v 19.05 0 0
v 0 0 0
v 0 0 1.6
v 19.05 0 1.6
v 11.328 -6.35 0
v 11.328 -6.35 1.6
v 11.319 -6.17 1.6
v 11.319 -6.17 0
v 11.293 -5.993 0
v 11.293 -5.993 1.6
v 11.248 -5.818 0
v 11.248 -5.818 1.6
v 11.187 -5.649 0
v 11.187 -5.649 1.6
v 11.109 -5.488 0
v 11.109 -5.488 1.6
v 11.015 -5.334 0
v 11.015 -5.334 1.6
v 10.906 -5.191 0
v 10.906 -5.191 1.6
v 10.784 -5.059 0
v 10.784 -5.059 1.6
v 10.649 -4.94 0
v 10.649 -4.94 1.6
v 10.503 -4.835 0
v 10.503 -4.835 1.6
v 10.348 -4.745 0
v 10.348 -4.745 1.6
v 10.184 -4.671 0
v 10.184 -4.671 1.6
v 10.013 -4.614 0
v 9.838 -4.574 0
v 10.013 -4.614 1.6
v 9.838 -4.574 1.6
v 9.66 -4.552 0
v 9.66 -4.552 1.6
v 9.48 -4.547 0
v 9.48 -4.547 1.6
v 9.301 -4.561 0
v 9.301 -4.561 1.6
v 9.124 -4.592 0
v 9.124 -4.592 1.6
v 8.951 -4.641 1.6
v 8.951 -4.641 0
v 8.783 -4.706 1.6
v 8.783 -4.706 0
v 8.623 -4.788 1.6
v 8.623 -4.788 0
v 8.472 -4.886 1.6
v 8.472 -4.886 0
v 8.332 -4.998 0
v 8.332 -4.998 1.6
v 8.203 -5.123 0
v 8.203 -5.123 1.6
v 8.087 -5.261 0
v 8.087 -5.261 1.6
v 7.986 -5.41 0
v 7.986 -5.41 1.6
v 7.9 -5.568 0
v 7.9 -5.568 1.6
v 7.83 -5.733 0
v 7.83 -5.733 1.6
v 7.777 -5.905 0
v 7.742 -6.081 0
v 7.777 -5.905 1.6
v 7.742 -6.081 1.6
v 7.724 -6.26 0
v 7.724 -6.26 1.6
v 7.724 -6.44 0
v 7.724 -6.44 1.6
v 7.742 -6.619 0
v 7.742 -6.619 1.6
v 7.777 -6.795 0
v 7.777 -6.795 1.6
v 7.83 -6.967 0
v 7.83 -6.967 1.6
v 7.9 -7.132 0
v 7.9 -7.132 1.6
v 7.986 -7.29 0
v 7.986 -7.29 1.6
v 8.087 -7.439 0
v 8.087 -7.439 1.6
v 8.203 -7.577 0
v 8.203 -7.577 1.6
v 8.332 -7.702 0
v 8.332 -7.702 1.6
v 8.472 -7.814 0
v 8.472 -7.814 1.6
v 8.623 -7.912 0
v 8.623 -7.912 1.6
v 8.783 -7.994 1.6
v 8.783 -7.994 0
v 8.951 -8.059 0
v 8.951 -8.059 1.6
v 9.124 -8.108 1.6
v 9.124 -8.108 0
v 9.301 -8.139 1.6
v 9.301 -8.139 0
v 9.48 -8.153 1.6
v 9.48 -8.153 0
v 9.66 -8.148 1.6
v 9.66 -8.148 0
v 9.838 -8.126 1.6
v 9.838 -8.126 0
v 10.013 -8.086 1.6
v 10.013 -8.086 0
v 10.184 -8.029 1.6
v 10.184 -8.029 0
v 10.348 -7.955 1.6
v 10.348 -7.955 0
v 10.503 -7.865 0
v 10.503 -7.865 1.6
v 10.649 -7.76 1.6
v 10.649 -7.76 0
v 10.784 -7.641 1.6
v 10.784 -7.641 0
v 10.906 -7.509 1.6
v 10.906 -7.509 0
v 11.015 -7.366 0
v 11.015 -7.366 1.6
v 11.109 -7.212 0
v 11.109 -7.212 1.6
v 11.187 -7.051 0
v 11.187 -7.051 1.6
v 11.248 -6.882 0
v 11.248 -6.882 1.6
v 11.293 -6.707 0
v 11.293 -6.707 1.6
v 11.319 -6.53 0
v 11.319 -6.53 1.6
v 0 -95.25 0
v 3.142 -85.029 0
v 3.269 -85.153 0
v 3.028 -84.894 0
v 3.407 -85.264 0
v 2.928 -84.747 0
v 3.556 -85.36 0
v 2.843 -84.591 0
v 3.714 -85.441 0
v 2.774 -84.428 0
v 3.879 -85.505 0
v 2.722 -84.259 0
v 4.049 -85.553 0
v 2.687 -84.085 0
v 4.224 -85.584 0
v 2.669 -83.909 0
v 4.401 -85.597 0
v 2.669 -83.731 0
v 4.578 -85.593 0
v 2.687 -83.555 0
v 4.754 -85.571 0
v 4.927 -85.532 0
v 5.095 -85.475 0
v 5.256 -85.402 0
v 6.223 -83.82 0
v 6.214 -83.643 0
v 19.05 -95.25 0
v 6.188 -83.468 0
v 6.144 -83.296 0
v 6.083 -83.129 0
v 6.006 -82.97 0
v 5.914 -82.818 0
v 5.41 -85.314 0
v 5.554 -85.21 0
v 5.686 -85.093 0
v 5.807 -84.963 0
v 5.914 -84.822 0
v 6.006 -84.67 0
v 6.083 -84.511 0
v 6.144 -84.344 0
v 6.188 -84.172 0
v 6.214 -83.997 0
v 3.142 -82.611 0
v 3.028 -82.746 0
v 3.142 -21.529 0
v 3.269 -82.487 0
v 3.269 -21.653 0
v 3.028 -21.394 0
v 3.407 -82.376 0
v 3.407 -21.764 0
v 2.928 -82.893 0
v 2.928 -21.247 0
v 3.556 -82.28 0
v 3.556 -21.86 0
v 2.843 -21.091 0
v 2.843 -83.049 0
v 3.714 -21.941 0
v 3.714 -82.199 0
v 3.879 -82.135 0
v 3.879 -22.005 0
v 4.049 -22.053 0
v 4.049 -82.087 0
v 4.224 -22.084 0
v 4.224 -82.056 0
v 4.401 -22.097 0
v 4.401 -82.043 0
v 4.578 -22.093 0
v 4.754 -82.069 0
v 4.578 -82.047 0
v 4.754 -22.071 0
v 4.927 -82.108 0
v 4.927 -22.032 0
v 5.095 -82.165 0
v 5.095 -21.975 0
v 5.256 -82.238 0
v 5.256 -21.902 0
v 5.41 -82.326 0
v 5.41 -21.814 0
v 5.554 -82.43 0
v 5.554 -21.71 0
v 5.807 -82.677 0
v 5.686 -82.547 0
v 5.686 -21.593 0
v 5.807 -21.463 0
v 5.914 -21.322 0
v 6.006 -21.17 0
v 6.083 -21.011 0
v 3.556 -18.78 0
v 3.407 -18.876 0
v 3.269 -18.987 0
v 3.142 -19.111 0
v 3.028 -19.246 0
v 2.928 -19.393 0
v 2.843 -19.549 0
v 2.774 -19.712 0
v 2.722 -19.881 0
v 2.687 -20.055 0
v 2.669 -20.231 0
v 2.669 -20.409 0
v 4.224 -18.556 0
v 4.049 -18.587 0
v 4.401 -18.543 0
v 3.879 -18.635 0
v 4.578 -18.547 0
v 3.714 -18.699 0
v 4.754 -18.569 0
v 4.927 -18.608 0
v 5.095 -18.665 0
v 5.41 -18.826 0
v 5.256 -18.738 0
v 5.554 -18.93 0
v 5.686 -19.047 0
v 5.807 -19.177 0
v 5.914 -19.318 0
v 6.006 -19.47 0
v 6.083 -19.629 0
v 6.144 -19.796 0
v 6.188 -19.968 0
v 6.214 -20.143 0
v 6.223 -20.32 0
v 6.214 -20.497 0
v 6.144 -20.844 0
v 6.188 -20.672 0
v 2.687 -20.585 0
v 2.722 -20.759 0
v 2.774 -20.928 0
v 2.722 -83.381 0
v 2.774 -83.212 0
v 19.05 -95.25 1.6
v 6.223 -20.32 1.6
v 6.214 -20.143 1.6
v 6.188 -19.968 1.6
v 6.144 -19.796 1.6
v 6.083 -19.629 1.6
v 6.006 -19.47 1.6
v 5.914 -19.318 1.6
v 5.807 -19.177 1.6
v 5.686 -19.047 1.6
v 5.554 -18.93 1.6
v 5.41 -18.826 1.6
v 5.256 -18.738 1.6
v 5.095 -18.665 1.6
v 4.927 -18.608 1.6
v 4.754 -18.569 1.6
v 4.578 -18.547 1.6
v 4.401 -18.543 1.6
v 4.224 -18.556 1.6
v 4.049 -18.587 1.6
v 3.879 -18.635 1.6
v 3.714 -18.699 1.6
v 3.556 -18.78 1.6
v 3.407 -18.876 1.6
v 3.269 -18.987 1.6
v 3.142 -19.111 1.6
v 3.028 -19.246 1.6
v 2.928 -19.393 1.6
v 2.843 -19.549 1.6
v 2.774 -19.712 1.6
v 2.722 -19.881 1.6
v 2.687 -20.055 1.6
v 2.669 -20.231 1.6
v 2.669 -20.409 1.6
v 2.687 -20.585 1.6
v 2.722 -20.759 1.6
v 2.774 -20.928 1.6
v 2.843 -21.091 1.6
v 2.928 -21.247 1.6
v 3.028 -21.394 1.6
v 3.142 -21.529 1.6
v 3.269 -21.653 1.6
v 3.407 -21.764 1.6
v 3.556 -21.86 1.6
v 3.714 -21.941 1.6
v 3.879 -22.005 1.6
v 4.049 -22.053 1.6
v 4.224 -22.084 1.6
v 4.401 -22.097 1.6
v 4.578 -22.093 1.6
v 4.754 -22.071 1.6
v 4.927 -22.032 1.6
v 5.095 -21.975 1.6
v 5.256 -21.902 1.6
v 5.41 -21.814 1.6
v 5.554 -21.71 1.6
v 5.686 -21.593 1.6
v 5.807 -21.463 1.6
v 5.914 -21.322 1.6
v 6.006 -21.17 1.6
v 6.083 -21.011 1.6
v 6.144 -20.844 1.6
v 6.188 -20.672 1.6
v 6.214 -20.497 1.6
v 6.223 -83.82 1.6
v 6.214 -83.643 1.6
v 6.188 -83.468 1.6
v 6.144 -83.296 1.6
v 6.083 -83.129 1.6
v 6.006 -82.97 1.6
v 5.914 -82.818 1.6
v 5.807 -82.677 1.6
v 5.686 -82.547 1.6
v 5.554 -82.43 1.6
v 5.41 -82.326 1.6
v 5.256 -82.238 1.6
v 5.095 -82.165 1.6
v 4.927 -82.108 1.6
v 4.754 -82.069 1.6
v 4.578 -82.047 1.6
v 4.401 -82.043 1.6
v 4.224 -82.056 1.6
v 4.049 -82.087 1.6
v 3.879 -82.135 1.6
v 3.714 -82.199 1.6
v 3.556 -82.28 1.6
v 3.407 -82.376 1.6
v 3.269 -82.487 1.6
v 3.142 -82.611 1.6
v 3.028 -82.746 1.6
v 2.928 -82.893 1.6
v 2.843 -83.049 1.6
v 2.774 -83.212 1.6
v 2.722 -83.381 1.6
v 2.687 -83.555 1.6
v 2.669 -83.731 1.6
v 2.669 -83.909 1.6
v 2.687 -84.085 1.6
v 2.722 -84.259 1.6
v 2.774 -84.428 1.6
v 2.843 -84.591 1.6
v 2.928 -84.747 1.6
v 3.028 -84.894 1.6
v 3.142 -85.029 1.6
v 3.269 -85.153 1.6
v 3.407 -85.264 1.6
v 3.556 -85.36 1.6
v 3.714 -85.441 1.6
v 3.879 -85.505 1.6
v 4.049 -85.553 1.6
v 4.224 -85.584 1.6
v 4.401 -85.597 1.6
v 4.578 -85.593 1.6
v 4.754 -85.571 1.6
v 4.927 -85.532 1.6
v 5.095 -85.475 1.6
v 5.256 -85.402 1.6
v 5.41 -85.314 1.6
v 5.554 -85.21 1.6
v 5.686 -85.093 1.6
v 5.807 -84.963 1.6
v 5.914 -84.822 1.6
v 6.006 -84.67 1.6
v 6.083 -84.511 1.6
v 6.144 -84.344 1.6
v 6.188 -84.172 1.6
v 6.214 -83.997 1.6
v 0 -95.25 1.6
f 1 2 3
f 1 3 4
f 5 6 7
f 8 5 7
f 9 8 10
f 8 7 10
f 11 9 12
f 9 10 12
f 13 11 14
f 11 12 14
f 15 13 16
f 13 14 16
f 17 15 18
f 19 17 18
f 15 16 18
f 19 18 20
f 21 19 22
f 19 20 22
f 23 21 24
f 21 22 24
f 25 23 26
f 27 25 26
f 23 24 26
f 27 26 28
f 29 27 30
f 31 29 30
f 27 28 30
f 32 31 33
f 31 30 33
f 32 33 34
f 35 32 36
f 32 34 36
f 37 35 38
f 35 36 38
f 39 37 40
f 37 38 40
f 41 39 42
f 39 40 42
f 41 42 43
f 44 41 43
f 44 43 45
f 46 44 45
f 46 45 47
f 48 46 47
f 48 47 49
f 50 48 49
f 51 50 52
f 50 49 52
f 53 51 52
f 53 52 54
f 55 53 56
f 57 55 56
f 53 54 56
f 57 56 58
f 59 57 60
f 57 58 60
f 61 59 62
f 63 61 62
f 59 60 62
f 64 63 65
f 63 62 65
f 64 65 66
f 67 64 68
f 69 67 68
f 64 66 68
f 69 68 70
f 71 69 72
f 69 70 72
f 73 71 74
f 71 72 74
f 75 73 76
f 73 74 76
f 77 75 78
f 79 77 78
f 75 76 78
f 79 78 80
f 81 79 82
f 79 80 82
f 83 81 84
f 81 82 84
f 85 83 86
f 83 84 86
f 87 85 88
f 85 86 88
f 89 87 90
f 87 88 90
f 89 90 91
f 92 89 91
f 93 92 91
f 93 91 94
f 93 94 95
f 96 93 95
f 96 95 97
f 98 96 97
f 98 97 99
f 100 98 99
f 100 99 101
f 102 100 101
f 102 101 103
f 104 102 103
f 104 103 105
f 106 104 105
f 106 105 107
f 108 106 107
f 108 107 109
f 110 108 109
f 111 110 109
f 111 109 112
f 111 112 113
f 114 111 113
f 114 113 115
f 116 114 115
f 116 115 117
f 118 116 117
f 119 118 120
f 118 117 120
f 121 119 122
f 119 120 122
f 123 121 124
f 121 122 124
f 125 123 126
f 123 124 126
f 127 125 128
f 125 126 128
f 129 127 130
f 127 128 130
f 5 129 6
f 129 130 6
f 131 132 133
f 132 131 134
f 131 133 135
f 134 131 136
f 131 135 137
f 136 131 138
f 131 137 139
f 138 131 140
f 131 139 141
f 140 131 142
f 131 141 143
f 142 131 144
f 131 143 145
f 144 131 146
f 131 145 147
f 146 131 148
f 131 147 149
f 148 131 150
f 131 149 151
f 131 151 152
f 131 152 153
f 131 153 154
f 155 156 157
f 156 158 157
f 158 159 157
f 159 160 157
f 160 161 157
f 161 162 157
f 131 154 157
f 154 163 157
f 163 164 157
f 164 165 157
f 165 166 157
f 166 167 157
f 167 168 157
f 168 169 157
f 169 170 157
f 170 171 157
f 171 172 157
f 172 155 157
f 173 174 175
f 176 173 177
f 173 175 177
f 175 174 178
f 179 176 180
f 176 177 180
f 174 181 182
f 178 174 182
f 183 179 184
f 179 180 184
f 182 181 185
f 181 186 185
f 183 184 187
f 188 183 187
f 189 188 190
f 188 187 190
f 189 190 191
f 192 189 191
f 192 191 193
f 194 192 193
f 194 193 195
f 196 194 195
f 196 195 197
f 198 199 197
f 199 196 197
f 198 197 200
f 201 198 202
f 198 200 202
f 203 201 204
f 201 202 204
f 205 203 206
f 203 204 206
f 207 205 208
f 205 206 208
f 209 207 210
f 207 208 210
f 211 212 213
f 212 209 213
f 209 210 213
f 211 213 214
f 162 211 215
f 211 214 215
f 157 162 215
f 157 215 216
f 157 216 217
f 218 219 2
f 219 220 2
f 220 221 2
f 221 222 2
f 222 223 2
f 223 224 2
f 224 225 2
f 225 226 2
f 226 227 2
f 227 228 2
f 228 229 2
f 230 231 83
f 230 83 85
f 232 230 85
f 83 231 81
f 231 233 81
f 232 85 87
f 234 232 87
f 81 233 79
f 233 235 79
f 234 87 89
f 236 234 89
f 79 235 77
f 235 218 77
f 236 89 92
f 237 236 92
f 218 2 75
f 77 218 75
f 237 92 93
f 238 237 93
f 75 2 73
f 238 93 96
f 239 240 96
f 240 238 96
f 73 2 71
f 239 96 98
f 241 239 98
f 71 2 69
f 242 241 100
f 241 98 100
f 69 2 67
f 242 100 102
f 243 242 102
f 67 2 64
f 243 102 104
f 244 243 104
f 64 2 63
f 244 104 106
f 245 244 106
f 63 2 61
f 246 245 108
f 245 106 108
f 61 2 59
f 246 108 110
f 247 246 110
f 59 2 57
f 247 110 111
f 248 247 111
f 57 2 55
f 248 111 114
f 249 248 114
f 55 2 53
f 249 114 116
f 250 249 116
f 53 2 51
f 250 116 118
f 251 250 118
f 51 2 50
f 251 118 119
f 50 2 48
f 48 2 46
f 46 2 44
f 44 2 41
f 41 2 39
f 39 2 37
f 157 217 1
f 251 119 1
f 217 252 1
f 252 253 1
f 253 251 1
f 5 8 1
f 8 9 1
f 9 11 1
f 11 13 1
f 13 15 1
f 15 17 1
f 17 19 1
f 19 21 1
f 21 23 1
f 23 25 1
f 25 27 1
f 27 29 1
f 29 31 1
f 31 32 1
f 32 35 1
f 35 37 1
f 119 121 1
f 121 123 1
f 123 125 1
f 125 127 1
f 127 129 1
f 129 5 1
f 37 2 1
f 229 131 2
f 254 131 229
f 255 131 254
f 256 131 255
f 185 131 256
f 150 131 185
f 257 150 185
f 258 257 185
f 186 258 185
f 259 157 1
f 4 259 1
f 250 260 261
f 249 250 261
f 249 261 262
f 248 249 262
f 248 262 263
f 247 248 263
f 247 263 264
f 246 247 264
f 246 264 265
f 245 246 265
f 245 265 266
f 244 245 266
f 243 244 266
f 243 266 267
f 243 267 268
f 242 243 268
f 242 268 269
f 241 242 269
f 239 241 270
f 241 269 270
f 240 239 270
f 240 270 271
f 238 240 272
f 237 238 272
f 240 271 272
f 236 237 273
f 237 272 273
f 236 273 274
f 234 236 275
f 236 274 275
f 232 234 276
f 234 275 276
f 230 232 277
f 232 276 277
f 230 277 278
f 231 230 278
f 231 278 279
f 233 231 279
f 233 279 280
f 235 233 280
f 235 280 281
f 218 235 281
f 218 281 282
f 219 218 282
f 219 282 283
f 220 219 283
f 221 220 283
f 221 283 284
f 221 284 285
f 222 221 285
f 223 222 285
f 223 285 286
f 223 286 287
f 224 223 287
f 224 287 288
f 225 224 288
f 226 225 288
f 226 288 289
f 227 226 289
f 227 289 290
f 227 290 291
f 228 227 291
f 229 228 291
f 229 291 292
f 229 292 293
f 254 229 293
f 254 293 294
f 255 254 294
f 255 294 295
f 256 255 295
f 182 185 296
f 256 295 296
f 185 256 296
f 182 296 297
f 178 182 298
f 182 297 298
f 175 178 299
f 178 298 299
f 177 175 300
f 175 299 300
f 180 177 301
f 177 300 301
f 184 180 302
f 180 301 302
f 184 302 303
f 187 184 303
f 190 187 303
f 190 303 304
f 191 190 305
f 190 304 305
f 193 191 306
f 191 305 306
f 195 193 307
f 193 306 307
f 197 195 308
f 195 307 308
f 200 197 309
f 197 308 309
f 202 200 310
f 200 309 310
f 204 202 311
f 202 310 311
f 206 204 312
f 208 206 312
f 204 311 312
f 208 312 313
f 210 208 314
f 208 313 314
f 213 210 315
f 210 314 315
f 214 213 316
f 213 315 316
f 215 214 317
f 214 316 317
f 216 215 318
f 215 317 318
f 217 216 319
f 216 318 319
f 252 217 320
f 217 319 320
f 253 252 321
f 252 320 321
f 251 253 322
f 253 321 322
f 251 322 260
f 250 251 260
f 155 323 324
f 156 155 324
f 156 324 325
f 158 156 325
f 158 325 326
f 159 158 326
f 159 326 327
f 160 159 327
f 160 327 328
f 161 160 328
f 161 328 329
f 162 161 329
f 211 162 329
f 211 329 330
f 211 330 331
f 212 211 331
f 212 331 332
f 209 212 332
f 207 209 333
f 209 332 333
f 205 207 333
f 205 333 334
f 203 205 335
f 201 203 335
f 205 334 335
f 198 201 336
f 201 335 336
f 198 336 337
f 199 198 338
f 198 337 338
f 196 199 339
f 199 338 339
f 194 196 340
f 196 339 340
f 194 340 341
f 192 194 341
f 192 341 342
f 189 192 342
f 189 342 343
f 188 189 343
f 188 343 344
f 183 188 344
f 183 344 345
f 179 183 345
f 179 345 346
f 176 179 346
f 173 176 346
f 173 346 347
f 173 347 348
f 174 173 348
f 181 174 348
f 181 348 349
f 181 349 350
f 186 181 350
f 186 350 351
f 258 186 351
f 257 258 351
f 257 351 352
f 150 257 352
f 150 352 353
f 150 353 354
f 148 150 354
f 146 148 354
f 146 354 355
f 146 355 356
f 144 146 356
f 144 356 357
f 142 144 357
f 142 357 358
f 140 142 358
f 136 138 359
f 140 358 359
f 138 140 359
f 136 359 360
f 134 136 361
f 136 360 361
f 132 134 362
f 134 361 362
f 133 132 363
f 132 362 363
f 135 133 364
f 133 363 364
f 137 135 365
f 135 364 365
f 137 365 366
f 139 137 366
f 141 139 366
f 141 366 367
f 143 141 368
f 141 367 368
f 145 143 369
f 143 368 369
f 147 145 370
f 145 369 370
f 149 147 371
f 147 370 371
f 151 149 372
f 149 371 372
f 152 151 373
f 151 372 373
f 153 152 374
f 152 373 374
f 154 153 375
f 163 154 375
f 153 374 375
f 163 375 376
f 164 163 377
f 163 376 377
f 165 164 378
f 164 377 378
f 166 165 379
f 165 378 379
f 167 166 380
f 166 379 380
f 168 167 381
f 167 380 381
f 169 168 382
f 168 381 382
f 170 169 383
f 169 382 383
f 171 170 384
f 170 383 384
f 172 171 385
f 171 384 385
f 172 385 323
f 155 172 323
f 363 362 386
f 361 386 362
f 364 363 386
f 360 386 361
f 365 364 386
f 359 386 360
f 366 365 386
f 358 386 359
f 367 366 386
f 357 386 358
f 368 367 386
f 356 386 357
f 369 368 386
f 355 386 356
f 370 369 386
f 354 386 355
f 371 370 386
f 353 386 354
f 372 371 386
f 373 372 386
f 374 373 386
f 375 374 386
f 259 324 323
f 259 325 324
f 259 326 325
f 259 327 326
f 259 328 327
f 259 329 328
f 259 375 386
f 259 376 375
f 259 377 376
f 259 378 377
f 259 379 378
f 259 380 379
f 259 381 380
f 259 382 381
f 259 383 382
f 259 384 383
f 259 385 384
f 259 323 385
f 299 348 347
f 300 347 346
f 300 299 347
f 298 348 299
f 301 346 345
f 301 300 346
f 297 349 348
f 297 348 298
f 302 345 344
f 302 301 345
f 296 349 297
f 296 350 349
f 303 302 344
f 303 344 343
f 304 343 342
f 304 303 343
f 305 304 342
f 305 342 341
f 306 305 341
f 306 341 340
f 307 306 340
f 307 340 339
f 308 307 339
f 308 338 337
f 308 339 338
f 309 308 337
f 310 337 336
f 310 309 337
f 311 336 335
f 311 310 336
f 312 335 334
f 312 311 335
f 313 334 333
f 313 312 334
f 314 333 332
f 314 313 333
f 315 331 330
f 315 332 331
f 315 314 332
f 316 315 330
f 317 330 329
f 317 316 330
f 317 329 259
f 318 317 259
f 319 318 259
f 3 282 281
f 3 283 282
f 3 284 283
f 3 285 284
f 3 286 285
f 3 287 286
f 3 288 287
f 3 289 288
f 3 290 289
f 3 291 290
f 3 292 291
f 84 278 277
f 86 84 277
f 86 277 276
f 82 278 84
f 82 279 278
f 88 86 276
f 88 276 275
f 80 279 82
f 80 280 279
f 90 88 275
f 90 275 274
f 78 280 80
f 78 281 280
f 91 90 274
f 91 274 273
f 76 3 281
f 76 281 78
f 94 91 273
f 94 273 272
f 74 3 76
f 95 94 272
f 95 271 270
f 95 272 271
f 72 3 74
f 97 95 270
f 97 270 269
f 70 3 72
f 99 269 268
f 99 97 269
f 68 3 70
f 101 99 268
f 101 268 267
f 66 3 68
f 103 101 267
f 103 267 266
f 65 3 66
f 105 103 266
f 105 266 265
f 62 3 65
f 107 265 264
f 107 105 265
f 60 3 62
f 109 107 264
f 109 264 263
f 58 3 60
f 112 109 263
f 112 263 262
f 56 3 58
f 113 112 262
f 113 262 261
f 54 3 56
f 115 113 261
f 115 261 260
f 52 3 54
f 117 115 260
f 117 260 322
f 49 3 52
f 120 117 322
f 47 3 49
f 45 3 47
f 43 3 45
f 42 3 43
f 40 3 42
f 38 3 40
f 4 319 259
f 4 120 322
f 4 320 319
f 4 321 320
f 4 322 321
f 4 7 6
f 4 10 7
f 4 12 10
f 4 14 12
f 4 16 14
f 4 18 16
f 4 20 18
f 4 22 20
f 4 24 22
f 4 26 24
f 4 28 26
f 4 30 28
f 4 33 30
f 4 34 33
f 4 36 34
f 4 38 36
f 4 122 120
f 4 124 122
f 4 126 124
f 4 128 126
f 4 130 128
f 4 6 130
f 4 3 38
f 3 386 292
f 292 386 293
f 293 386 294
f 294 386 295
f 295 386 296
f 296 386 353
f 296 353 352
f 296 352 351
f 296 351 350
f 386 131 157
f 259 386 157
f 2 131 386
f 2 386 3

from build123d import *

# Parameters (mm, degrees)
SKETCH1_W          = 19.05
SKETCH1_H          = 95.25
EXTRUDE1_DEPTH     = 1.6002
SKETCH2_R          = 1.8034
CUT_EXTRUDE1_DEPTH = 1.6002
SKETCH3_R          = 1.778
CUT_EXTRUDE2_DEPTH = 2.54


with BuildPart() as part:
    # Sketch1 → Extrude1 (new body)
    with BuildSketch(Plane.XY):
        with Locations((9.525, -47.625)):
            Rectangle(SKETCH1_W, SKETCH1_H)
    extrude(amount=EXTRUDE1_DEPTH)

    # Sketch2 → Cut-Extrude1 (cut)
    with BuildSketch(Plane.XY.offset(1.6002)):
        with Locations((9.525, -6.35)):
            Circle(SKETCH2_R)
    extrude(amount=-CUT_EXTRUDE1_DEPTH, mode=Mode.SUBTRACT)

    # Sketch3 → Cut-Extrude2 (cut)
    with BuildSketch(Plane.XY.offset(1.6002)):
        with Locations((4.445, -20.32)):
            Circle(SKETCH3_R)
        with Locations((4.445, -83.82)):
            Circle(SKETCH3_R)
    extrude(amount=-CUT_EXTRUDE2_DEPTH, mode=Mode.SUBTRACT)


solid = part.part
